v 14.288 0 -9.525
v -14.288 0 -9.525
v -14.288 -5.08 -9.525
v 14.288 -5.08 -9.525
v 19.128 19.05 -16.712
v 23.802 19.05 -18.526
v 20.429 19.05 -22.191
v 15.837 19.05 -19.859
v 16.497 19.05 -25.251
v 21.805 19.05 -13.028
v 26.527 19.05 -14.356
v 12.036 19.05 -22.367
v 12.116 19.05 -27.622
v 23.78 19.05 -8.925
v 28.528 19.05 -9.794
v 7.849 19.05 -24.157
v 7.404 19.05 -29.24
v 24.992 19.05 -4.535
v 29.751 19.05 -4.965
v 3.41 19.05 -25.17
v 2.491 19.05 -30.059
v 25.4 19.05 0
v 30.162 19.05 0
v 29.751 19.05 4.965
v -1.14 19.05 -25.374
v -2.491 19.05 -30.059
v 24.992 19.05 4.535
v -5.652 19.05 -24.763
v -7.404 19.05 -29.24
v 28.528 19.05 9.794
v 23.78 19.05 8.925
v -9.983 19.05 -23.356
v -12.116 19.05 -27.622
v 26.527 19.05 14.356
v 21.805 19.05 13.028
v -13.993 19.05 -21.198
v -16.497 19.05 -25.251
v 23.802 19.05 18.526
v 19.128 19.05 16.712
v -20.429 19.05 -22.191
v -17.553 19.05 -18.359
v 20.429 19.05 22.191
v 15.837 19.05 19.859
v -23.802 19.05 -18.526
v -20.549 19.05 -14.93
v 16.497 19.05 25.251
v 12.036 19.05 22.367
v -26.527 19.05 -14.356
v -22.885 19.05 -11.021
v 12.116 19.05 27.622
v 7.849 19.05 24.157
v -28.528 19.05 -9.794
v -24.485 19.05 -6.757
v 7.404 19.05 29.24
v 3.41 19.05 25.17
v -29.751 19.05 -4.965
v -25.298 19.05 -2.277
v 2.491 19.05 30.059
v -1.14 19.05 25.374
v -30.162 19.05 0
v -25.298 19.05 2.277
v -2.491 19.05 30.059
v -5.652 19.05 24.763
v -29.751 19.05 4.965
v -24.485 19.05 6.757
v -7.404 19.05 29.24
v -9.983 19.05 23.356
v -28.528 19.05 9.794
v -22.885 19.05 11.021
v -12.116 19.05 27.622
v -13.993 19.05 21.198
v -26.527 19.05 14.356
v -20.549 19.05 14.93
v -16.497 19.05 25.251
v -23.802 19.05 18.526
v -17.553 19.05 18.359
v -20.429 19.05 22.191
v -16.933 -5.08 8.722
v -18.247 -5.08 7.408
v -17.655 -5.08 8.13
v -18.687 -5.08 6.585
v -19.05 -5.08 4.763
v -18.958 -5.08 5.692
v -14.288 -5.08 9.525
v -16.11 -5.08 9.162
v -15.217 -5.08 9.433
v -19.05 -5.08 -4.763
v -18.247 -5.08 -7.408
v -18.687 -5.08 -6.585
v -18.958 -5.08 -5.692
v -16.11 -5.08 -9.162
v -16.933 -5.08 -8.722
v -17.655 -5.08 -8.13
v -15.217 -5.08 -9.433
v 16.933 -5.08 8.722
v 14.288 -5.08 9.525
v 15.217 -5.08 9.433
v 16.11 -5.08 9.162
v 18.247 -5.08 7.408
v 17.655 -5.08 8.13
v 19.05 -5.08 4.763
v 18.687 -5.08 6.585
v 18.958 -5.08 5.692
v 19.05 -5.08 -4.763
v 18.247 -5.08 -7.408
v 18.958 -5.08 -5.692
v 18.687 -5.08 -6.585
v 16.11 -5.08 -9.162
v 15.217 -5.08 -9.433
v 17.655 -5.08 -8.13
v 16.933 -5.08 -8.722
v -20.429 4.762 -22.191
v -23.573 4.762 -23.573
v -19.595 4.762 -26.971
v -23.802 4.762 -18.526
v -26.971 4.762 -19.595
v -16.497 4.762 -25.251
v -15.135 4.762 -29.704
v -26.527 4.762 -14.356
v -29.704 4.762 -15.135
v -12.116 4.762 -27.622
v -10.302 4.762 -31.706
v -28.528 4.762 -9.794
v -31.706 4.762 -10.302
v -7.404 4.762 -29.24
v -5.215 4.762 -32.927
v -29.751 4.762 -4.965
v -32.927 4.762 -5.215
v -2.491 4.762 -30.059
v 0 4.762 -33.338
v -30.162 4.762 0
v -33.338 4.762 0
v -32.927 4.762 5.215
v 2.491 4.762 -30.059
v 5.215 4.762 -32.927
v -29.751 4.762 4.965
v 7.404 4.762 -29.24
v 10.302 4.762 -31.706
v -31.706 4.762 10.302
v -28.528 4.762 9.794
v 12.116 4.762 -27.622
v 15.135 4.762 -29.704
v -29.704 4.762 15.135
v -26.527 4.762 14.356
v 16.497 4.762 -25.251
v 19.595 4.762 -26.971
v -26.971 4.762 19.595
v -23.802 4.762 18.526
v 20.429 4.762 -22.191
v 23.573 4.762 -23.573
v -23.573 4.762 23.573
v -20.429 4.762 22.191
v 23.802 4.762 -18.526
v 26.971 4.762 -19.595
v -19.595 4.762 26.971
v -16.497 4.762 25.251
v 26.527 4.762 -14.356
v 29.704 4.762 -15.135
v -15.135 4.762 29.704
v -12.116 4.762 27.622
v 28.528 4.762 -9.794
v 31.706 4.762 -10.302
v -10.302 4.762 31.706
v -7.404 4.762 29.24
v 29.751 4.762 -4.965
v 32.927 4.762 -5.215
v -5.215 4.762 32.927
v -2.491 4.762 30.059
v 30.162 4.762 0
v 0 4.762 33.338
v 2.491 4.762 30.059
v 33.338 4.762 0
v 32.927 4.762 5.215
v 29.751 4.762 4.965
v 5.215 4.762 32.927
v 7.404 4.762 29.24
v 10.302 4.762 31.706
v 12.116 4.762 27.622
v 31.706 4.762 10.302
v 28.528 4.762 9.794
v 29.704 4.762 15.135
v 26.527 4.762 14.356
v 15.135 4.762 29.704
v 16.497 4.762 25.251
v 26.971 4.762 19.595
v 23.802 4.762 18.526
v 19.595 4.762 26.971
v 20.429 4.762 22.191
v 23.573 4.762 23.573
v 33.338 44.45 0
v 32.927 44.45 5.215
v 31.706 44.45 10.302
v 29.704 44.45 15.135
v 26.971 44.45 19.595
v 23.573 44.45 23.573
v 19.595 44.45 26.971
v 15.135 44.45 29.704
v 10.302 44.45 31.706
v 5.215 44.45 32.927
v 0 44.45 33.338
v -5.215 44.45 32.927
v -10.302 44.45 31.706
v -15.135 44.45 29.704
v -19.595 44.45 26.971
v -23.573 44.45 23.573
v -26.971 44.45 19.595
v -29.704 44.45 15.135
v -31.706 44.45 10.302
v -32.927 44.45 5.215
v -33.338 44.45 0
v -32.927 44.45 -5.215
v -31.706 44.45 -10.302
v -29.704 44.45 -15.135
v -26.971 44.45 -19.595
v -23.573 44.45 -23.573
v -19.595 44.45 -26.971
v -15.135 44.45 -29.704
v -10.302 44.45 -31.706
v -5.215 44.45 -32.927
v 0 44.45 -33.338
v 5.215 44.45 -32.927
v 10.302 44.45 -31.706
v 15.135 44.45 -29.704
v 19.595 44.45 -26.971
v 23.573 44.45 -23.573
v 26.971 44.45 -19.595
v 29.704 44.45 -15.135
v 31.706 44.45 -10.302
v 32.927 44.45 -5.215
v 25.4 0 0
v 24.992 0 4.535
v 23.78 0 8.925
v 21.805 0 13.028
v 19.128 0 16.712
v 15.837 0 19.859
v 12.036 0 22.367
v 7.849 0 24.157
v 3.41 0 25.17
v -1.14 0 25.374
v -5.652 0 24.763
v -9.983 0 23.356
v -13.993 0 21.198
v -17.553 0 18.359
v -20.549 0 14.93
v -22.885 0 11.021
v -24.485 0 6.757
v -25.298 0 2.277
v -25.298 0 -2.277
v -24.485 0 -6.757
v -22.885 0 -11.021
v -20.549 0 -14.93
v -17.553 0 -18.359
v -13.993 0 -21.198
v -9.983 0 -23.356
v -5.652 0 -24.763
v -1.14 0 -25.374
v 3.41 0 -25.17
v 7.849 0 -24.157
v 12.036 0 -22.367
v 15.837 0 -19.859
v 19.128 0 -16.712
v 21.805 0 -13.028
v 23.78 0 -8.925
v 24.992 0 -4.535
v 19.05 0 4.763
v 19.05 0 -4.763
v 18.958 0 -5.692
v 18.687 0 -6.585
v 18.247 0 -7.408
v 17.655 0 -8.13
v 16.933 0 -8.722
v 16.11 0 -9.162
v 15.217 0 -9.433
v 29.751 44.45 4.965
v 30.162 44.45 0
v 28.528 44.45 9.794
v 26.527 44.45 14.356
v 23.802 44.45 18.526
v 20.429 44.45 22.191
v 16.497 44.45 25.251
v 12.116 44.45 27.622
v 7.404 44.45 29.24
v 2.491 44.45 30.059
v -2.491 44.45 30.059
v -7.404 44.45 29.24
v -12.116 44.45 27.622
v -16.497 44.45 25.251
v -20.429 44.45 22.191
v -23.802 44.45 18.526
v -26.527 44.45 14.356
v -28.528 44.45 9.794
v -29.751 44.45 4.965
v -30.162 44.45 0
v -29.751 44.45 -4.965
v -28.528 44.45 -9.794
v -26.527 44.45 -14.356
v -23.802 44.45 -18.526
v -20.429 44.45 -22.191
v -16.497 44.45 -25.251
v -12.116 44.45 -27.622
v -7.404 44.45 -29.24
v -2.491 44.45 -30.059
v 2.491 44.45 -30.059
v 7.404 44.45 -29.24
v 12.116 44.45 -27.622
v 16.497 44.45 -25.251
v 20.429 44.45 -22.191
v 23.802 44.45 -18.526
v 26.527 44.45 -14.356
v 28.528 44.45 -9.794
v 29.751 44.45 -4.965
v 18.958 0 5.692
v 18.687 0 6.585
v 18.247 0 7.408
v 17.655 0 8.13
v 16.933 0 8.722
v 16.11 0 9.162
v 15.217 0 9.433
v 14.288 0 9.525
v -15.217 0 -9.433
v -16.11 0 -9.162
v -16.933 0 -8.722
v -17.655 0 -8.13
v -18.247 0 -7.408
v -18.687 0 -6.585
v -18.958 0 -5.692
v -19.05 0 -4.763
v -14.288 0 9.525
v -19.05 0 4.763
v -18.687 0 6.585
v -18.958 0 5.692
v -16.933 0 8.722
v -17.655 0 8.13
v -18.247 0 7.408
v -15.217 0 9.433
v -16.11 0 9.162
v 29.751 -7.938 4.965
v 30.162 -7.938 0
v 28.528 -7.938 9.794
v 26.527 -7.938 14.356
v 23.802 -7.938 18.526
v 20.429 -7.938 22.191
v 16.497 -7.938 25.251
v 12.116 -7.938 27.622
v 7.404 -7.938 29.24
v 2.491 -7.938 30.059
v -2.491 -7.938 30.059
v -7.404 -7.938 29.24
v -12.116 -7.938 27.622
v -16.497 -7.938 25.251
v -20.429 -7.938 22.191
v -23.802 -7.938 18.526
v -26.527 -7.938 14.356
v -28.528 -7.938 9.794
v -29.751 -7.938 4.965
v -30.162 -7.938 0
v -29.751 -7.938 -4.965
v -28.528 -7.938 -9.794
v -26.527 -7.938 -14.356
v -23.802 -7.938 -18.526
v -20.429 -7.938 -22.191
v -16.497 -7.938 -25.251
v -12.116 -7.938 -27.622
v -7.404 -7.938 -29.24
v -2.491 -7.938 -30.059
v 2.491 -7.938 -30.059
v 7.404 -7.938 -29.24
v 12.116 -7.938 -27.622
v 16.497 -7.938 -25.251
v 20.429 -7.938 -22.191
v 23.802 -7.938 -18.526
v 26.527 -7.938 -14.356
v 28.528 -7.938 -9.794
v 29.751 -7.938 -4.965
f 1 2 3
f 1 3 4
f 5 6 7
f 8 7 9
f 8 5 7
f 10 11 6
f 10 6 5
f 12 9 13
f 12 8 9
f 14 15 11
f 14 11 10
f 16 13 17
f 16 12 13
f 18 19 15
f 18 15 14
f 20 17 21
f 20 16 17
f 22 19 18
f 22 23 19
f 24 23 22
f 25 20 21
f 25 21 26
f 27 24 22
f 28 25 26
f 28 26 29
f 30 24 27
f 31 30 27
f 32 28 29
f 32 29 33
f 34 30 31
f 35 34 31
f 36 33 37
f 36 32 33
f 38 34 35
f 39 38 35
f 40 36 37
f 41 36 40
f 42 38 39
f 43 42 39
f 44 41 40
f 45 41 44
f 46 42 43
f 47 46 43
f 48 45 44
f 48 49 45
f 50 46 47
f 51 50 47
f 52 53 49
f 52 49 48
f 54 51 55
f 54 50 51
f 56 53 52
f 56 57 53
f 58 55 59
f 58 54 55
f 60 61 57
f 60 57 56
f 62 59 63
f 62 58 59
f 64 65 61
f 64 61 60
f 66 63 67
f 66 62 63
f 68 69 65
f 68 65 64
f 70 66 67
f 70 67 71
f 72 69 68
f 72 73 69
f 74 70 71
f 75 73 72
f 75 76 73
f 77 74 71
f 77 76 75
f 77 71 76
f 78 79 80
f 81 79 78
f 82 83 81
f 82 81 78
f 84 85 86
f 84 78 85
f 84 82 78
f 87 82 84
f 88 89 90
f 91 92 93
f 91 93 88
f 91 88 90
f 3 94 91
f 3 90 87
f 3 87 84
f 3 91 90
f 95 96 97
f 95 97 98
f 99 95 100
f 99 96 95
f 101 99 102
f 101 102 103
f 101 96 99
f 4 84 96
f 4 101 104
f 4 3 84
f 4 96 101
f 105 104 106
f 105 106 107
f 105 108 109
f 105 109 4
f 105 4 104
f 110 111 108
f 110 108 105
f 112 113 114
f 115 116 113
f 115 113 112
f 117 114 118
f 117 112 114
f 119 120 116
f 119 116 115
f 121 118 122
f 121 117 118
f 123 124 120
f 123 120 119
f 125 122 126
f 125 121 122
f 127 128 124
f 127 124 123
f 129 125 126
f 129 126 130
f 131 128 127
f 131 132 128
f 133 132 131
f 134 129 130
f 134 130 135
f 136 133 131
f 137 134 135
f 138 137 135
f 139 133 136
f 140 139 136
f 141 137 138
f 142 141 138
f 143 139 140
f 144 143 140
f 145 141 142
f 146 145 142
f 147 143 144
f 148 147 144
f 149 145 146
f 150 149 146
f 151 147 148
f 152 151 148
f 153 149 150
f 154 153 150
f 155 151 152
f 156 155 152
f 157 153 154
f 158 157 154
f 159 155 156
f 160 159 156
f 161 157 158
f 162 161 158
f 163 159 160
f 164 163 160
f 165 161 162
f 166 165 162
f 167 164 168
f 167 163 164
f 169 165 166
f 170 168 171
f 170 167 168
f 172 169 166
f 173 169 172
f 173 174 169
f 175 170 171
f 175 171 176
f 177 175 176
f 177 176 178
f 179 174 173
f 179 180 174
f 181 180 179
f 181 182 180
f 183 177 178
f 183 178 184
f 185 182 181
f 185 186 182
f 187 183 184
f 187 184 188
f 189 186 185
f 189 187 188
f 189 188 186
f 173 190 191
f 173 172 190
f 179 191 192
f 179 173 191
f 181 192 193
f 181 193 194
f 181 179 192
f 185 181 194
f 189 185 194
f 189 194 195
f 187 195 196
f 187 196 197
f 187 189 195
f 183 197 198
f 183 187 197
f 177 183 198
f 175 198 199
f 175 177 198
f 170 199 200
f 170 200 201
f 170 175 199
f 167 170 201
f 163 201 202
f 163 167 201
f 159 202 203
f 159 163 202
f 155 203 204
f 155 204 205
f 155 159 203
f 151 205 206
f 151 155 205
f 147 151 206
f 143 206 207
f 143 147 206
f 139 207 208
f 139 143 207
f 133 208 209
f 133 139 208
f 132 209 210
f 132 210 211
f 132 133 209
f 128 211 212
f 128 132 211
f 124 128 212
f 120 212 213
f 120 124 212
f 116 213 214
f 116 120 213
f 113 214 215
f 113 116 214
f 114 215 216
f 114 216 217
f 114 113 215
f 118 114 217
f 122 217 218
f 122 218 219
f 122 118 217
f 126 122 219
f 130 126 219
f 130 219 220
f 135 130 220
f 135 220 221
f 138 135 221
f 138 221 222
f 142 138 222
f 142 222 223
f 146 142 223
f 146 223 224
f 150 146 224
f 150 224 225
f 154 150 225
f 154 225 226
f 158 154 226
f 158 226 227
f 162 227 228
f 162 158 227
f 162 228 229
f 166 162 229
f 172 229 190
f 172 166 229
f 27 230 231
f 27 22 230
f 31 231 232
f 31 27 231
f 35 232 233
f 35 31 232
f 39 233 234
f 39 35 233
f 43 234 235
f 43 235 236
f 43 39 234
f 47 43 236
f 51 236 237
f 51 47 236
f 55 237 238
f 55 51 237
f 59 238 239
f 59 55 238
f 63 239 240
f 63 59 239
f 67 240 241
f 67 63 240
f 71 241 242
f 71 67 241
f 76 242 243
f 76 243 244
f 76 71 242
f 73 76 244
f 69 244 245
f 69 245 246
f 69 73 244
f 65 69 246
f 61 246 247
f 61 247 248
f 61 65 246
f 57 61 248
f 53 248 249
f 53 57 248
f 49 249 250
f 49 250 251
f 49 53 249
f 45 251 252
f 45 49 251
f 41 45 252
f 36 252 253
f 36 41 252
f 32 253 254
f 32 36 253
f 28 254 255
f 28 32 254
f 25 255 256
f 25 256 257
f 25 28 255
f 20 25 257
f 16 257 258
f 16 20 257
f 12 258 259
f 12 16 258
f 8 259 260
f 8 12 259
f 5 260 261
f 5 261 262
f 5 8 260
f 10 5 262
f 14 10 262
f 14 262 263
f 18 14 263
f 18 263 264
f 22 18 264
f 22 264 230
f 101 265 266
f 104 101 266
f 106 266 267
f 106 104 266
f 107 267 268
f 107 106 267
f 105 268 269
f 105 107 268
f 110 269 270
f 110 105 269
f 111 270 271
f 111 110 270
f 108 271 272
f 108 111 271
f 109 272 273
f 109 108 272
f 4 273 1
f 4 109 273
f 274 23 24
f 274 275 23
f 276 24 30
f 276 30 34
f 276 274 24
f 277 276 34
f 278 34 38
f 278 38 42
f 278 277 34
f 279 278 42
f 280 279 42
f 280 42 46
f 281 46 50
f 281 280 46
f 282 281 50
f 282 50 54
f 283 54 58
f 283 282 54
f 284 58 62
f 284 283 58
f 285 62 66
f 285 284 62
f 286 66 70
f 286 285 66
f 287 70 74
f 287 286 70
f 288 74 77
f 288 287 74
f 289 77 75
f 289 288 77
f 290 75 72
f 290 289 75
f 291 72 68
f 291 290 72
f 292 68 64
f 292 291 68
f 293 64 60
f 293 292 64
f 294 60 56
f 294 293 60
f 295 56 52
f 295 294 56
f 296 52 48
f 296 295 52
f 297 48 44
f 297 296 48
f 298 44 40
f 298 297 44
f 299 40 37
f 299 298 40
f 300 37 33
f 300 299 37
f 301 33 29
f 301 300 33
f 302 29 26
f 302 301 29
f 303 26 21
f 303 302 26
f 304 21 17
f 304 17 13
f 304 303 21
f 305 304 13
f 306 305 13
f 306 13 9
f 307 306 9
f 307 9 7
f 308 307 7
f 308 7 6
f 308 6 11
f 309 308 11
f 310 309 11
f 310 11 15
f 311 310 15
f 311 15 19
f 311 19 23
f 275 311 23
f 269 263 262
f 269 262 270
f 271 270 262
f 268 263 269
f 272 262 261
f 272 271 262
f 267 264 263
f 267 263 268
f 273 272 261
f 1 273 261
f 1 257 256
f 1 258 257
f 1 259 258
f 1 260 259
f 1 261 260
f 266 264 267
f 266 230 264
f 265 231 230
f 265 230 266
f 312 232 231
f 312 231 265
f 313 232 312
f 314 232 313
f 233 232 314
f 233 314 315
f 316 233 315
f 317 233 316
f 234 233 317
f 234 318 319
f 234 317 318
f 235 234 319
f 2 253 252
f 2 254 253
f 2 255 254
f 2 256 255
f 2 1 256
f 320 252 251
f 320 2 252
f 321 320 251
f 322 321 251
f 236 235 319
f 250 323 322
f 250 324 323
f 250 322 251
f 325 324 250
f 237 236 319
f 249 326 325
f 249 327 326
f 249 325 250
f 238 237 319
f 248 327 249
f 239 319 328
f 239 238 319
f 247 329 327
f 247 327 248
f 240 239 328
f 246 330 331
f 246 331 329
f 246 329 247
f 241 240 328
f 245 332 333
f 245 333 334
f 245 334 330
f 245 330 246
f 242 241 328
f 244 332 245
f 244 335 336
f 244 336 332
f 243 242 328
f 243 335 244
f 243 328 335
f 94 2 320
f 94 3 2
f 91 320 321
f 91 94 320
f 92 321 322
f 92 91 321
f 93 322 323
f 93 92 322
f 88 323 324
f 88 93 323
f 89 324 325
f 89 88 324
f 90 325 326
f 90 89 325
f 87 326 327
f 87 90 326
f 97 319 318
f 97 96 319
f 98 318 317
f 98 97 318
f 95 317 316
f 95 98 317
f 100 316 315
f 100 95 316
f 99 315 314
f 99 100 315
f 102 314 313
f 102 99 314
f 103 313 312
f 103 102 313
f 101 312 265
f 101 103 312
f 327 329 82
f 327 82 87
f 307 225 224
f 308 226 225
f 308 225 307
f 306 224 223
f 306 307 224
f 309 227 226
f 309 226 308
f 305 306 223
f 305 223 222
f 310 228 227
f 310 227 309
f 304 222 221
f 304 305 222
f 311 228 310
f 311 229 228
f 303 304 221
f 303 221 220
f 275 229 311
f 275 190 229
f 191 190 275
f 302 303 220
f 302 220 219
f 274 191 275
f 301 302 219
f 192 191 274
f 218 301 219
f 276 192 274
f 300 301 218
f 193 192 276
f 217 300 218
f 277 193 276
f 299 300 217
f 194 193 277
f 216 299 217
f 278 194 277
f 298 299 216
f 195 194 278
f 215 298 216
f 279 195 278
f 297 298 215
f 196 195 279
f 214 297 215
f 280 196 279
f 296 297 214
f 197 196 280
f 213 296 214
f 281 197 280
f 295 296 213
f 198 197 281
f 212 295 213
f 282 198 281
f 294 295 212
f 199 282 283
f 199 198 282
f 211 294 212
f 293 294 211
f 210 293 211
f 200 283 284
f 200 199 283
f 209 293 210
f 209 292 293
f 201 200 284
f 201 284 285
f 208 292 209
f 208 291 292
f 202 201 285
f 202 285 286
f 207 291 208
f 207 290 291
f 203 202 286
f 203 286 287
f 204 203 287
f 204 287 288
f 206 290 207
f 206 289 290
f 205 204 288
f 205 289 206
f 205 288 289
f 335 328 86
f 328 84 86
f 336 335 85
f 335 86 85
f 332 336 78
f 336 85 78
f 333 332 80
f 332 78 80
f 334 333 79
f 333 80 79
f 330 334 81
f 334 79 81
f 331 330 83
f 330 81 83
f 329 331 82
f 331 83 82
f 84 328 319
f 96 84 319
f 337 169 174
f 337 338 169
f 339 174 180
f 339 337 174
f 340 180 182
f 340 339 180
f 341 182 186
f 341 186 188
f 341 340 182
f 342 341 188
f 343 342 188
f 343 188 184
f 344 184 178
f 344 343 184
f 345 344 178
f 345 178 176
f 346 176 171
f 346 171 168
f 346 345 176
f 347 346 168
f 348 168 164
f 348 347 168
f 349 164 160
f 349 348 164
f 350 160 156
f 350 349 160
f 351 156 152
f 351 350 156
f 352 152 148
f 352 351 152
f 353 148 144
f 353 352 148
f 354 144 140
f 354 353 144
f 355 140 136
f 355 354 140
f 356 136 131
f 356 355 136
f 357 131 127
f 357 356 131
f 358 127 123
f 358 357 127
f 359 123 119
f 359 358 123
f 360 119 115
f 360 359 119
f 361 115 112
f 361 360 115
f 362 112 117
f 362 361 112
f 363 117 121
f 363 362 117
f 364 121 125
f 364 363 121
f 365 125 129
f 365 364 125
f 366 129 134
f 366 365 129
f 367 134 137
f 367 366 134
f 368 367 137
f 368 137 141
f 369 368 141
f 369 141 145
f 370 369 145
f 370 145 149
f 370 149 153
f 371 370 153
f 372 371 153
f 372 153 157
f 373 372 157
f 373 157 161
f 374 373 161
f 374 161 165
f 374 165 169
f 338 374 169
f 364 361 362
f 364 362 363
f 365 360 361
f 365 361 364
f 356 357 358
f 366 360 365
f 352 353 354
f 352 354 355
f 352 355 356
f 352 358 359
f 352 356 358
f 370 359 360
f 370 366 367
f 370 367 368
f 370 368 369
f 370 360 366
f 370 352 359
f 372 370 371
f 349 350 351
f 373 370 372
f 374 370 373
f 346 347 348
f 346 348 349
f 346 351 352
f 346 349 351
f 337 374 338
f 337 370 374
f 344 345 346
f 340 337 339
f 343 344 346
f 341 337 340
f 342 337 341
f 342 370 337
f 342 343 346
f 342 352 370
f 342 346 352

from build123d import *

# Parameters (mm, degrees)
SKETCH2_W          = 38.1
SKETCH2_H          = 19.05
CUT_EXTRUDE1_DEPTH = 5.08
FILLET1_R          = 4.7625


with BuildPart() as part:
    # Sketch1 → Revolve1 (revolve)
    with BuildSketch(Plane.XY):
        Polygon((0, 0), (25.4, 0), (25.4, 19.05), (30.1625, 19.05), (30.1625, 44.45), (33.3375, 44.45), (33.3375, 4.7625), (30.1625, 4.7625), (30.1625, -7.9375), (0, -7.9375), align=None)
    revolve(axis=Axis((0, 0, 0), (0, -1, 0)))

    # Sketch2 → Cut-Extrude1 (cut)
    with BuildSketch(Plane(origin=(0, 0, 0), x_dir=(1, 0, 0), z_dir=(0, 1, 0))):
        Rectangle(SKETCH2_W, SKETCH2_H)
    extrude(amount=-CUT_EXTRUDE1_DEPTH, mode=Mode.SUBTRACT)

    # Fillet1
    fillet1_edges = [part.edges().sort_by_distance(p)[0] for p in [
        (19.05, -2.54, -9.525),
        (19.05, -2.54, 9.525),
        (-19.05, -2.54, 9.525),
        (-19.05, -2.54, -9.525),
    ]]
    fillet(fillet1_edges, radius=FILLET1_R)


solid = part.part
